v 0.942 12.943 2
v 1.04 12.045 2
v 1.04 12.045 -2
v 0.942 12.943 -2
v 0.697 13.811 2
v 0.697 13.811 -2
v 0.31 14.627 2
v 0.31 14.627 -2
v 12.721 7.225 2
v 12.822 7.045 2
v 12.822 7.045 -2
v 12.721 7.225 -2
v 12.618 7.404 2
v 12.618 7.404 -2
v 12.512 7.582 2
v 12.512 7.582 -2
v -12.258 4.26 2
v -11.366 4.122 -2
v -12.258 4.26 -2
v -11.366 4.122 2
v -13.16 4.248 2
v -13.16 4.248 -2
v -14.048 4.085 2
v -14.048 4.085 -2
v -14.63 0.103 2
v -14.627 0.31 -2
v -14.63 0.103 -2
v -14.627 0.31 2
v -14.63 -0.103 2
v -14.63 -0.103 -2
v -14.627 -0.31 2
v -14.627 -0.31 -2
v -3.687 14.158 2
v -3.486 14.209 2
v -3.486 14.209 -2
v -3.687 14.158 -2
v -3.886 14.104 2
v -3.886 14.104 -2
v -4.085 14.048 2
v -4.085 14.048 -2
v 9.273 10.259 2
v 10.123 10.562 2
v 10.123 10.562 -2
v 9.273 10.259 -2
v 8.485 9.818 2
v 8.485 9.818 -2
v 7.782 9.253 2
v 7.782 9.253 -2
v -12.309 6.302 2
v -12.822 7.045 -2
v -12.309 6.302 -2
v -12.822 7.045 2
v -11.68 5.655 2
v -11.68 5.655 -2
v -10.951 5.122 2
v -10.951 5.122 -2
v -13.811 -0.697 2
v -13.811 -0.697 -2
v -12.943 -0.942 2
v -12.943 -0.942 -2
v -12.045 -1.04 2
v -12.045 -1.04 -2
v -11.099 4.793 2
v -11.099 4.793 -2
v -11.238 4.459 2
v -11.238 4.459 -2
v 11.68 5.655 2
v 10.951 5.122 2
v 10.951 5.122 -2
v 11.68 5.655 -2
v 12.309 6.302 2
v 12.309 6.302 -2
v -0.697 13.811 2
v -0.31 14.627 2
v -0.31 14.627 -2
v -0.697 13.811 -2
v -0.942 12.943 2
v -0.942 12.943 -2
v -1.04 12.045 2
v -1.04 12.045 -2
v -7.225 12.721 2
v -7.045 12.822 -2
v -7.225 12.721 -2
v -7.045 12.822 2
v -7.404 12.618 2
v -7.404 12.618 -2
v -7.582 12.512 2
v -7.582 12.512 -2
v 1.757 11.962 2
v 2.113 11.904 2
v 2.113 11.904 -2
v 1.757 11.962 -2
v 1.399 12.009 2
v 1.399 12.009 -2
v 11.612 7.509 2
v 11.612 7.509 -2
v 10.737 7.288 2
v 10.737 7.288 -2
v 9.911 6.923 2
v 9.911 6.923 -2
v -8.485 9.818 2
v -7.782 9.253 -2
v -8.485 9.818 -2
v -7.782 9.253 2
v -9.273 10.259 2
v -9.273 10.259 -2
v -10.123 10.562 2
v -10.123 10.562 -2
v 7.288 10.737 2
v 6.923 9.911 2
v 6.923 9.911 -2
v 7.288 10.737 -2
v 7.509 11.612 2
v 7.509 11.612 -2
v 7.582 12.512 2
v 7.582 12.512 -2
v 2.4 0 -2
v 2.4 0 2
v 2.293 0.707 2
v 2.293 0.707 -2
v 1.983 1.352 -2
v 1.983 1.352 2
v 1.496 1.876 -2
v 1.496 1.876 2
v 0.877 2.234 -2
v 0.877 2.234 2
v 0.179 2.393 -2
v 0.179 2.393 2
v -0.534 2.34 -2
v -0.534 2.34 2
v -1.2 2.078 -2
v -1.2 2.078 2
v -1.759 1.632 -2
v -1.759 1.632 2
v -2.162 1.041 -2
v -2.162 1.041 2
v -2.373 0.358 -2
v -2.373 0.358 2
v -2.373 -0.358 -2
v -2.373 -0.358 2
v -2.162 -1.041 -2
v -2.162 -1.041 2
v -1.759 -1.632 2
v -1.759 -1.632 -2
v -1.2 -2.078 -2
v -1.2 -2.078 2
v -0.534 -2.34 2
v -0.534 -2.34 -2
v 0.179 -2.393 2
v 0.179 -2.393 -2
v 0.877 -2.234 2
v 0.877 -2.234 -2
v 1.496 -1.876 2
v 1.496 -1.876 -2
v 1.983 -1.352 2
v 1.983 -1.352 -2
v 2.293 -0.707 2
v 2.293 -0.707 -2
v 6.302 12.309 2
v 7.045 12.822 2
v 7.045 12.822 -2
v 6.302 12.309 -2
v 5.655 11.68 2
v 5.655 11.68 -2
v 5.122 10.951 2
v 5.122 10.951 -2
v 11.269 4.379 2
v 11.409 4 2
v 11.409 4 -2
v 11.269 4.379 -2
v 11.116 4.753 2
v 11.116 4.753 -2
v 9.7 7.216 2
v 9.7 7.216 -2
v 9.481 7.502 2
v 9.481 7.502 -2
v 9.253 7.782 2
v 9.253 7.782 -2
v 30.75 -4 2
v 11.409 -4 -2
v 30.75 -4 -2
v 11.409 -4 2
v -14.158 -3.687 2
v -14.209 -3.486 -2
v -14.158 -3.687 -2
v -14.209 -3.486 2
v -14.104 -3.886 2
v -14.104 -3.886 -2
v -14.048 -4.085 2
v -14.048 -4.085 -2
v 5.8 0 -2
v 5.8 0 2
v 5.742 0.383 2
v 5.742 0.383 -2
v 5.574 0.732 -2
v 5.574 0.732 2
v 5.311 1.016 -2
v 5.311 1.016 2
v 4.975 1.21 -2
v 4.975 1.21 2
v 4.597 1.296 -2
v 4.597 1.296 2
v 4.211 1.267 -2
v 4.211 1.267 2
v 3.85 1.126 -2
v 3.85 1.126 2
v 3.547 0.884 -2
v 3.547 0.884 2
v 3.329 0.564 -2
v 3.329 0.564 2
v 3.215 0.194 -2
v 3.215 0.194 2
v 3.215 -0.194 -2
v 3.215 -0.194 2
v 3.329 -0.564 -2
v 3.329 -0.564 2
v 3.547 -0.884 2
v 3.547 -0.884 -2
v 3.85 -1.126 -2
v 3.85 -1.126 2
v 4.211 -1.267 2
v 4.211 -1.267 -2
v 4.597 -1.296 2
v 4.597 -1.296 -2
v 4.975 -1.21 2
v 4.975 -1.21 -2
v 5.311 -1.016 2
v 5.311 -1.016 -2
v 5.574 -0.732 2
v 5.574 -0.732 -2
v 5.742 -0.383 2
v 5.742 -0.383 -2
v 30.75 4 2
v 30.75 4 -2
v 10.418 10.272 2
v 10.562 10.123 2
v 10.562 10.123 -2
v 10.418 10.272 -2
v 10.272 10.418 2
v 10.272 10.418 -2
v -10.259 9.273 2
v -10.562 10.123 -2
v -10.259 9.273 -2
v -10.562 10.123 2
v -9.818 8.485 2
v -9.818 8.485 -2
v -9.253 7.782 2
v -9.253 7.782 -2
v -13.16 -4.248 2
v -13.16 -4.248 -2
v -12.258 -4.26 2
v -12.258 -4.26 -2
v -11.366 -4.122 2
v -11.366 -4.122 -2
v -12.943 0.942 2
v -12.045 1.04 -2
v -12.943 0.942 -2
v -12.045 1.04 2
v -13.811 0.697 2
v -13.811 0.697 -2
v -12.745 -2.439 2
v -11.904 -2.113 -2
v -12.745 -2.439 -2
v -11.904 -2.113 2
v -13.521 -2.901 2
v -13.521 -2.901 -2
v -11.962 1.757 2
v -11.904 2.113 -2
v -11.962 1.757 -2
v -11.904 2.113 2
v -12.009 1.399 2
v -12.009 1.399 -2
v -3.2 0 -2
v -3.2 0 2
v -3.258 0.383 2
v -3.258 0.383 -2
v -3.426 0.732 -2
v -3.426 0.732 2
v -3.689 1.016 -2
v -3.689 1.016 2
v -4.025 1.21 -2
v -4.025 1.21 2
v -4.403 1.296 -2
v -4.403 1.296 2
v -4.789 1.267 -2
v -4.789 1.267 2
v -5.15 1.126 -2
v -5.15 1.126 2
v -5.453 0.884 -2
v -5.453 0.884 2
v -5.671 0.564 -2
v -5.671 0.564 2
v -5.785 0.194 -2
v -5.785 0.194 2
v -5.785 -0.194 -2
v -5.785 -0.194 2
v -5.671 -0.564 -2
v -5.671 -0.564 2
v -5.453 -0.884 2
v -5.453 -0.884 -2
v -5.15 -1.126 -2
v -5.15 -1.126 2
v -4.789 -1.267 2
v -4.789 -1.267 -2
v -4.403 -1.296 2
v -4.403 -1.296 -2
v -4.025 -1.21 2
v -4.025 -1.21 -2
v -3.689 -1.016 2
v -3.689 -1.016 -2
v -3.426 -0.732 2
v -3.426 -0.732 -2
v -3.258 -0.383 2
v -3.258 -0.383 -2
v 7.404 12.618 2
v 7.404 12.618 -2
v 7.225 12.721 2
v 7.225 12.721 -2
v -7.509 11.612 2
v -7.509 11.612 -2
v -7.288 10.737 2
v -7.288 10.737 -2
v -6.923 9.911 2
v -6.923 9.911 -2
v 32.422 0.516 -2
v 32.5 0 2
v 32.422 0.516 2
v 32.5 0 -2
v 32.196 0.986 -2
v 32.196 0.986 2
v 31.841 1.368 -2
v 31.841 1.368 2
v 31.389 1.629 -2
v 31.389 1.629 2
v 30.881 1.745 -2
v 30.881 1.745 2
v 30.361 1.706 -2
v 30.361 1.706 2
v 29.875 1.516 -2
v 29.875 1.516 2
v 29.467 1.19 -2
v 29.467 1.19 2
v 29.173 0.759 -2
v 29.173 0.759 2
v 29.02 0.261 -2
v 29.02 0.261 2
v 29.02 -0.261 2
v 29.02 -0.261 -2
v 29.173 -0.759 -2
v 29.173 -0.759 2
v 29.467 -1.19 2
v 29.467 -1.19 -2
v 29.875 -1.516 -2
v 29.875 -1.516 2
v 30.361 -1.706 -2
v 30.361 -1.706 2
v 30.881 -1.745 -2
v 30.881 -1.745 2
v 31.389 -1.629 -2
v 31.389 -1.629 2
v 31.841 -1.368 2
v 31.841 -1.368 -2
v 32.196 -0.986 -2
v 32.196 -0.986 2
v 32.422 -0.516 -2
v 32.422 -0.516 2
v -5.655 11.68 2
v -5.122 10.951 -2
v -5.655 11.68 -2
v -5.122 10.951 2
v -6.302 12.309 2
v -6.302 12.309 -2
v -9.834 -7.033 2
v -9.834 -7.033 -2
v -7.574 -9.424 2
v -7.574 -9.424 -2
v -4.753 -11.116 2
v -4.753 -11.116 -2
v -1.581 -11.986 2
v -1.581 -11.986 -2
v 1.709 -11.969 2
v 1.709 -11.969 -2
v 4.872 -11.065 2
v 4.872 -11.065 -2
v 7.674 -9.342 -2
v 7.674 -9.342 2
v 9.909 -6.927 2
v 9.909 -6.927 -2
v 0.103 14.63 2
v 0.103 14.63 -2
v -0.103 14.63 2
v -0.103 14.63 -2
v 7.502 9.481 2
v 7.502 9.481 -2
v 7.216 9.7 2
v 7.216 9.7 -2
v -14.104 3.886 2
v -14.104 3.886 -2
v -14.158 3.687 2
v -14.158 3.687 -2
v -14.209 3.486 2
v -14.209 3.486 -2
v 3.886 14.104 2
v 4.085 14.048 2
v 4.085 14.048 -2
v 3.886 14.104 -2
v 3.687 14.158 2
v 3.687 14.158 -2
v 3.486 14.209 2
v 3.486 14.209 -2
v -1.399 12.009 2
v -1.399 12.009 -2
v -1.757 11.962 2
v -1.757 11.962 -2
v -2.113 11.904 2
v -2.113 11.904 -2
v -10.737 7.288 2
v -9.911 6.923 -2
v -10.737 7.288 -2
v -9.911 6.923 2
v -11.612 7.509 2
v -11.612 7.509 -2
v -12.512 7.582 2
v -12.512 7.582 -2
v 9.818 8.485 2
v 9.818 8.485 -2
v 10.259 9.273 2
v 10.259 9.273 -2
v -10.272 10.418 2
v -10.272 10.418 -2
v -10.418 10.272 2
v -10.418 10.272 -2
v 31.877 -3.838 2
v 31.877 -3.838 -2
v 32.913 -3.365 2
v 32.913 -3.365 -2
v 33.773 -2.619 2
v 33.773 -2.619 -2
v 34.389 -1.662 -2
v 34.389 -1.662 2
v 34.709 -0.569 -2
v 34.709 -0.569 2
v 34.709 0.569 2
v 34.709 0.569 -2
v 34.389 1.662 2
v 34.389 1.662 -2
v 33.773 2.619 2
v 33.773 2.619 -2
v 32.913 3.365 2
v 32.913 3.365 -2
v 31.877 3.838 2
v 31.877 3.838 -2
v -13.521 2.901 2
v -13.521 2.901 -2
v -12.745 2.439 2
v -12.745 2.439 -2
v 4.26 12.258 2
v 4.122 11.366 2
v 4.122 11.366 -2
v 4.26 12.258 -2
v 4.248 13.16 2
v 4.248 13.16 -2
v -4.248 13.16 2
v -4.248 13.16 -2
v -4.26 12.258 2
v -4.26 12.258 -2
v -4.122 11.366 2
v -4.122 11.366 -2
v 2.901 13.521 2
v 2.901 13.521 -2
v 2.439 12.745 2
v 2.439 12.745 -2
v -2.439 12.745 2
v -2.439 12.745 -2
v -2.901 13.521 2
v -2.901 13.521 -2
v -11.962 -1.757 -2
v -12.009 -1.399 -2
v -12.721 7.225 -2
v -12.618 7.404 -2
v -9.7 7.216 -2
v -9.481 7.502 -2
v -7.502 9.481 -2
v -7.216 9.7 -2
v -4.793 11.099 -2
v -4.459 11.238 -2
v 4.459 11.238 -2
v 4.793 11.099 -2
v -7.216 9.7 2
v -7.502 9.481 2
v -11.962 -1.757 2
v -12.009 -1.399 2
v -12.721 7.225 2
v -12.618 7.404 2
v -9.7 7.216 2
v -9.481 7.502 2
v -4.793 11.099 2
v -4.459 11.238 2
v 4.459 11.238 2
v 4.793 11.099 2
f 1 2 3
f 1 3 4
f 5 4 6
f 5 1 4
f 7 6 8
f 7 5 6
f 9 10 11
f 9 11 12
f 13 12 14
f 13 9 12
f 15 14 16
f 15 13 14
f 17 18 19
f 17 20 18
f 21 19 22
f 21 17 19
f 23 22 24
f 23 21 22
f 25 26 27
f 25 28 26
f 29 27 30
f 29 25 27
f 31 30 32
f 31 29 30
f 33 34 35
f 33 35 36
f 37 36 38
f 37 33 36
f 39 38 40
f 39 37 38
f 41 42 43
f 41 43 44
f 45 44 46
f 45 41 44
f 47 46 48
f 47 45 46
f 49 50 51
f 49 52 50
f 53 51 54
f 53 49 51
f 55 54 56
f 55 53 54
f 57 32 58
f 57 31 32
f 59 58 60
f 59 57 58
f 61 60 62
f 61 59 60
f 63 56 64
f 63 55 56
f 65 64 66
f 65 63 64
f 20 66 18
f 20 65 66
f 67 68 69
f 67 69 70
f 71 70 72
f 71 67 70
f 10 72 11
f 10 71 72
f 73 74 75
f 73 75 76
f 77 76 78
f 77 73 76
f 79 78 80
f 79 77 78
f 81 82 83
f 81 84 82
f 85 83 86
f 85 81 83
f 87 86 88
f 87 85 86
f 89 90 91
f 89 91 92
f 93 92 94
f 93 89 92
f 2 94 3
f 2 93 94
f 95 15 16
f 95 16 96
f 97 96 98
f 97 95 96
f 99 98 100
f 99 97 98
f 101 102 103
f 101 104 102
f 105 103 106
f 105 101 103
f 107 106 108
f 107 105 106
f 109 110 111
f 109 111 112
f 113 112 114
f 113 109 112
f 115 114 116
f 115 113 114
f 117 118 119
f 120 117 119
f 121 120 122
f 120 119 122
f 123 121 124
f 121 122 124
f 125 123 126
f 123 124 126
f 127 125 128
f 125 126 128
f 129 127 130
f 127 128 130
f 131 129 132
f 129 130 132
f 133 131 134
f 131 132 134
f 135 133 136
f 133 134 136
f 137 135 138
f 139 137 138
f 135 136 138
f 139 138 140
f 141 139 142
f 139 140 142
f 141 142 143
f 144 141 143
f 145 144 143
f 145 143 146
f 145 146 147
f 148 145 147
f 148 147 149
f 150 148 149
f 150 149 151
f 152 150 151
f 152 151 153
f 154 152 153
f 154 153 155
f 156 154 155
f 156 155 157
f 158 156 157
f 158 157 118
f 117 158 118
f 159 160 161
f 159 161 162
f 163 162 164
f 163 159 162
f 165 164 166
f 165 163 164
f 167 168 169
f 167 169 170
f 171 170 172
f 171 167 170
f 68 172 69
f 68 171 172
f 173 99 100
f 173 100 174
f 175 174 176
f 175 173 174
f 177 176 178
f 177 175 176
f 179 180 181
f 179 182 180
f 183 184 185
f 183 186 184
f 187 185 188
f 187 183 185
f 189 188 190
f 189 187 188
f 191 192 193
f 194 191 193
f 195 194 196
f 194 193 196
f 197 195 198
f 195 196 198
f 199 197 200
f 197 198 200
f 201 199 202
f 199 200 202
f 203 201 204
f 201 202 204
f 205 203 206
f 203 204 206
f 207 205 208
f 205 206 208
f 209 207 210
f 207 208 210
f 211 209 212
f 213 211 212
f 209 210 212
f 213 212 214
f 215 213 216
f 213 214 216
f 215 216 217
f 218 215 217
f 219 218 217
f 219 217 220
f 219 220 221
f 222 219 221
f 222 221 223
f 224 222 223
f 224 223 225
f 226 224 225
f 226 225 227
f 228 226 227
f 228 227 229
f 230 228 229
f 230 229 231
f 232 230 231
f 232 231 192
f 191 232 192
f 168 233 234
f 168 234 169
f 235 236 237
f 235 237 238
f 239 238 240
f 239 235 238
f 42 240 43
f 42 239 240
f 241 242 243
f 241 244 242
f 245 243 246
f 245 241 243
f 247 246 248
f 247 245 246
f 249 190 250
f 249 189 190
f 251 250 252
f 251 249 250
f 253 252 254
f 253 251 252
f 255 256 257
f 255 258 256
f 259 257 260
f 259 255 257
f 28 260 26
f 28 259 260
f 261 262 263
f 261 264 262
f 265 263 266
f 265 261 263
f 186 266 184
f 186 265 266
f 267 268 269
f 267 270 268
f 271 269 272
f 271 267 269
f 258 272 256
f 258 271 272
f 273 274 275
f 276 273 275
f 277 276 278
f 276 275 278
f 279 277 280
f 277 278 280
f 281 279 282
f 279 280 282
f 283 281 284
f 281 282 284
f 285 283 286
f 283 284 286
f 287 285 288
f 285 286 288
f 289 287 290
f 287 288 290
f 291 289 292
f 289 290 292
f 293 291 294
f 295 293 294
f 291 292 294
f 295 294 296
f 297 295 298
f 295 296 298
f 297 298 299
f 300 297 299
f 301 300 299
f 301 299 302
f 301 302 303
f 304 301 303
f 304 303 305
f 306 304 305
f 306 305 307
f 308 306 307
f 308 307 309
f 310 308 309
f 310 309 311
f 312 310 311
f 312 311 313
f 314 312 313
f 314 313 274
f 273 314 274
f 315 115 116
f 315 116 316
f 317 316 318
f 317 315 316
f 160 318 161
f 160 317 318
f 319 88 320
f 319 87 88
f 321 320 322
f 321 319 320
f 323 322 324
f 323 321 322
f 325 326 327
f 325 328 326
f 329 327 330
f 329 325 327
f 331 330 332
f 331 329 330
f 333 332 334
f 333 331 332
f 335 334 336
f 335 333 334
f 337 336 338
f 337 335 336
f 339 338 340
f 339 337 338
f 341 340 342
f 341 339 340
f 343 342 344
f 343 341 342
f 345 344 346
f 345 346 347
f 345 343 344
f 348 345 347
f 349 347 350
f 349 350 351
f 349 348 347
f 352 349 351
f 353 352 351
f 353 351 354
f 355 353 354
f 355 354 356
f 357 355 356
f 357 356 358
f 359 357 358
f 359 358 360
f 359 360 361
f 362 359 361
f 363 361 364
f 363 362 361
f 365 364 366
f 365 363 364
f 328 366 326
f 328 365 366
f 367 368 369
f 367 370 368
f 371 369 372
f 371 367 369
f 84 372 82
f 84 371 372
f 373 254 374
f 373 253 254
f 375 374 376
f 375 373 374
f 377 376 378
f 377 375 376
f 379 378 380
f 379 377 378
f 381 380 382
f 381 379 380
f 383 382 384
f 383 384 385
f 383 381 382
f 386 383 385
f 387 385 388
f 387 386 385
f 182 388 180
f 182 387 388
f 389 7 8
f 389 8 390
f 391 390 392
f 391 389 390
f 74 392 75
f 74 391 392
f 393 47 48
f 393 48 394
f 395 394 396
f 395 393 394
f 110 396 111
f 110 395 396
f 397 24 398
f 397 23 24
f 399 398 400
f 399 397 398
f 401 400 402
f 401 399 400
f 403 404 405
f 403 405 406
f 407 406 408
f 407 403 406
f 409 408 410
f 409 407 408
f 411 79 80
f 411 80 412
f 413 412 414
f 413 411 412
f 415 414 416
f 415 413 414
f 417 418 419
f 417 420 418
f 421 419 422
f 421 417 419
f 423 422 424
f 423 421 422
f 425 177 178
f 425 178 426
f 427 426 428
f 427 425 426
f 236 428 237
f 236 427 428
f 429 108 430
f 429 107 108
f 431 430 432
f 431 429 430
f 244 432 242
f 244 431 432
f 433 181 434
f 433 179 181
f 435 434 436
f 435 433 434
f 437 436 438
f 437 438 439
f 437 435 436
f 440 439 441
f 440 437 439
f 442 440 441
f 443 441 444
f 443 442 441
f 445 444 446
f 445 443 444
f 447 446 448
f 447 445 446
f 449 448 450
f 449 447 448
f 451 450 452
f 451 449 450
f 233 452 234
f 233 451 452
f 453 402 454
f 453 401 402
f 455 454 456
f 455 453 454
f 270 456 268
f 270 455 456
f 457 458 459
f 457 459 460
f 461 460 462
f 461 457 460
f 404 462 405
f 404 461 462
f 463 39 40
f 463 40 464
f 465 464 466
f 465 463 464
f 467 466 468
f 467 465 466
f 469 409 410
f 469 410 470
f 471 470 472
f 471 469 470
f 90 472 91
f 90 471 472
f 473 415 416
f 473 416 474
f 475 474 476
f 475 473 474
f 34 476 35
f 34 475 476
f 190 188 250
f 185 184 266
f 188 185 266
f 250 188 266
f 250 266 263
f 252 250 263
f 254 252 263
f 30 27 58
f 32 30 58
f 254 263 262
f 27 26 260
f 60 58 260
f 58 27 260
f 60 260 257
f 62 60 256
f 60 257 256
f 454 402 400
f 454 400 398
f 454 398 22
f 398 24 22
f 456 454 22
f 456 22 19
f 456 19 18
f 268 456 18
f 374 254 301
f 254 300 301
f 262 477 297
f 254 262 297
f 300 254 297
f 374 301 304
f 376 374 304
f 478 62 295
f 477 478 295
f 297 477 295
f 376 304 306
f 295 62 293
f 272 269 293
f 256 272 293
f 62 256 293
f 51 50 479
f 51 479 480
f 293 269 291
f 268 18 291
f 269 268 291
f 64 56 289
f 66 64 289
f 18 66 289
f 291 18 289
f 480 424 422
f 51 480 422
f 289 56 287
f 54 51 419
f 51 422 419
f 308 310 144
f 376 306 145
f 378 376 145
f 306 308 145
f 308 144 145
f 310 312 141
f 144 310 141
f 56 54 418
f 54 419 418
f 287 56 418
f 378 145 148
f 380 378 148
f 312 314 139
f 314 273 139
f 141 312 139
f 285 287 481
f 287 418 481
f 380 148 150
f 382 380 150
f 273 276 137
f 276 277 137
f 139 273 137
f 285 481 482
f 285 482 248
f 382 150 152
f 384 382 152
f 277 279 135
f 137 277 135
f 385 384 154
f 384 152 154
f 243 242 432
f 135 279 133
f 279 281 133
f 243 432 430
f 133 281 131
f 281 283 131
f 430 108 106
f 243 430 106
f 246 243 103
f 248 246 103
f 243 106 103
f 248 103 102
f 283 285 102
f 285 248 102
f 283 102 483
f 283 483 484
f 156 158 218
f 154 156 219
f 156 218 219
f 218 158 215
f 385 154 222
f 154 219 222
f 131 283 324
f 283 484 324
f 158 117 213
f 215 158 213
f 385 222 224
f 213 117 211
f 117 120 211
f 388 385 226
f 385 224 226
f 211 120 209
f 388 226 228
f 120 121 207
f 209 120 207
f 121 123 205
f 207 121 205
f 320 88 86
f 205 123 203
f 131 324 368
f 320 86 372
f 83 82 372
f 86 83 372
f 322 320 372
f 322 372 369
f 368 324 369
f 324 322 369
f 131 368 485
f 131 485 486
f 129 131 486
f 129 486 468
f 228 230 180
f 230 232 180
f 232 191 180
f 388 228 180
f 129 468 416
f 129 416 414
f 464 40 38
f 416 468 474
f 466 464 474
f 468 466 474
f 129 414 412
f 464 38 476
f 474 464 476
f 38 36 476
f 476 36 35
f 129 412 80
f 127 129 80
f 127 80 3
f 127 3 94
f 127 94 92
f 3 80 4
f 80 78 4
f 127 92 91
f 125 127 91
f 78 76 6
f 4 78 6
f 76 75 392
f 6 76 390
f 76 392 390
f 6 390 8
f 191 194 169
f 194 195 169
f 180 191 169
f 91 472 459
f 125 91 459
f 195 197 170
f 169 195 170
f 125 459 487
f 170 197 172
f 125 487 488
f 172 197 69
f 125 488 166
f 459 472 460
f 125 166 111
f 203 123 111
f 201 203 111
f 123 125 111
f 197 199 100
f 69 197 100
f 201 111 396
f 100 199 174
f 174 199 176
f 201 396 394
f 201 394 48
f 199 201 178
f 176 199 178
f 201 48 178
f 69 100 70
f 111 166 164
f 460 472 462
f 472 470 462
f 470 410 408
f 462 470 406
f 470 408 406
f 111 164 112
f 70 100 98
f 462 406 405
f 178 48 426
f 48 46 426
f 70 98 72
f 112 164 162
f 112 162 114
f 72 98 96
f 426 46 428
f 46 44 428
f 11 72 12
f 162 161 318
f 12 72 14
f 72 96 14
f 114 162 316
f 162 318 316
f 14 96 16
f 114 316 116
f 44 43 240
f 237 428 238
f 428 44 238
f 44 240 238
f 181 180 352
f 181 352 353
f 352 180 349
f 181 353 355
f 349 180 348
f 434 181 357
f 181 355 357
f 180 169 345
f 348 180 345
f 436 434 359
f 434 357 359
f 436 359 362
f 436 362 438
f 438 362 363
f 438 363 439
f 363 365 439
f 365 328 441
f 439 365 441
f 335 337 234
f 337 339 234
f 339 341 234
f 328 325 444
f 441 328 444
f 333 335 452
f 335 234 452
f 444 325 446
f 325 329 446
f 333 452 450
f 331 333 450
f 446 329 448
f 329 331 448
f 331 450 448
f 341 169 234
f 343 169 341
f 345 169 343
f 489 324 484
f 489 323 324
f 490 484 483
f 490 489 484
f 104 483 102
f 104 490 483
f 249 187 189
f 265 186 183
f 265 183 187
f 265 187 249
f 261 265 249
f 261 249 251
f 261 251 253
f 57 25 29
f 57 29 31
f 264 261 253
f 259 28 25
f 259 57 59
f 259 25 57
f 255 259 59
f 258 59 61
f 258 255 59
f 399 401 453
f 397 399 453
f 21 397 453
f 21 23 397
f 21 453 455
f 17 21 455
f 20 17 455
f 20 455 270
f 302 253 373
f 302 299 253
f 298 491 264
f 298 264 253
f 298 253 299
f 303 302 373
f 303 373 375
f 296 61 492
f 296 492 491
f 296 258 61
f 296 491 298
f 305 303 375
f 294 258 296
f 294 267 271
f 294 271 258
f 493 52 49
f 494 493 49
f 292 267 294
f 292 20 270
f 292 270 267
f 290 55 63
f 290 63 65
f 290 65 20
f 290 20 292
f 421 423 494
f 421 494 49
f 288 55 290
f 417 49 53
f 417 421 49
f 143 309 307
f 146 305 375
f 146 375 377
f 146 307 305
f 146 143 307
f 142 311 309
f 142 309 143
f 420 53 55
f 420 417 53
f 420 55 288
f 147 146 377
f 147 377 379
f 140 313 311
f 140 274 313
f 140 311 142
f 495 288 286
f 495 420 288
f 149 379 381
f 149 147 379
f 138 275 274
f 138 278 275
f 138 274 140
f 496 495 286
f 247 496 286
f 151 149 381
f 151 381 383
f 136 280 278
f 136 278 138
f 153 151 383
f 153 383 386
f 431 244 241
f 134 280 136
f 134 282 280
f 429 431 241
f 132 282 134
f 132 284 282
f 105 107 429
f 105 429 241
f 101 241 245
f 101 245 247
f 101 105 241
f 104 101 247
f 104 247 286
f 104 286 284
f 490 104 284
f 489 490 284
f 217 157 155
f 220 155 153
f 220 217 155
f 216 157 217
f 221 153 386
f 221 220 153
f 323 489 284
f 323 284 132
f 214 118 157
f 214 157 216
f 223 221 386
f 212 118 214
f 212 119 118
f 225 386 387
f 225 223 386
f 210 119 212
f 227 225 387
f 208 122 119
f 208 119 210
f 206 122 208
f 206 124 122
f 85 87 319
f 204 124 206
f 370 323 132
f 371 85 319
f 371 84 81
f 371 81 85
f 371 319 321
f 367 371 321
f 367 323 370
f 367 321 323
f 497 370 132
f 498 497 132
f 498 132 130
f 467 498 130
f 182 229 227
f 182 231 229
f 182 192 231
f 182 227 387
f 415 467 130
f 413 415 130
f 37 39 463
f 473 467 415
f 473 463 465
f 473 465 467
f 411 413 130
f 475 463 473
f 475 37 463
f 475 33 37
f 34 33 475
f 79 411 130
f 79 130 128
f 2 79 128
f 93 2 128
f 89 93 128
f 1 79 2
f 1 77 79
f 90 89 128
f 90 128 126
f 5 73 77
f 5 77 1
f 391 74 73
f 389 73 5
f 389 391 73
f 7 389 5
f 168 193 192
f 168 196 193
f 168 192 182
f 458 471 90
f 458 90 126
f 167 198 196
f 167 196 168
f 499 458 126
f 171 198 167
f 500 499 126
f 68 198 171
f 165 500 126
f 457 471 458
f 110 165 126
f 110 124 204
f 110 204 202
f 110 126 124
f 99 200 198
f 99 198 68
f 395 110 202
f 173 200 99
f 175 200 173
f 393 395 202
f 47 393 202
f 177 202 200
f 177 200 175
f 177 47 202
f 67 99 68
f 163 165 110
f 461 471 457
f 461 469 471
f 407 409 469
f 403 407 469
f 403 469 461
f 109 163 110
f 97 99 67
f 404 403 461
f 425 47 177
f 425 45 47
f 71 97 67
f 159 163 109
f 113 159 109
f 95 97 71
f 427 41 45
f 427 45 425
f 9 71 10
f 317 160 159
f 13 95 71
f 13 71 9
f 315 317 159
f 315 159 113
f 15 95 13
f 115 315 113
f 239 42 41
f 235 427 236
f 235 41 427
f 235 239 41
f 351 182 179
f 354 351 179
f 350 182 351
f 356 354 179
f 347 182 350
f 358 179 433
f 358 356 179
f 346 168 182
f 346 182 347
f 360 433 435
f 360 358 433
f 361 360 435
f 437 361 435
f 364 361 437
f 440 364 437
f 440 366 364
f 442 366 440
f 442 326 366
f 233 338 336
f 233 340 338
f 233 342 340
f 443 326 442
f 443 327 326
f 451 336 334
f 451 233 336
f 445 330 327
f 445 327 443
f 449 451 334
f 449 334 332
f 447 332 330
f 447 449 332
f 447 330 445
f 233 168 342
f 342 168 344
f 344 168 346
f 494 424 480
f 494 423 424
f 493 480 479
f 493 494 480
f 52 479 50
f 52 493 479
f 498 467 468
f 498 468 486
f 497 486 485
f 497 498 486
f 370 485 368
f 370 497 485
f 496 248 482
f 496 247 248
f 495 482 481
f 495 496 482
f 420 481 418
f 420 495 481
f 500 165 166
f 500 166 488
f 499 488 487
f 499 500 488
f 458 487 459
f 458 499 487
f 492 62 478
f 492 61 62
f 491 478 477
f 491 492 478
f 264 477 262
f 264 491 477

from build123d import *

# Parameters (mm, degrees)
ESQUISSE1_R                  = 1.75
BOSS_EXTRU_1_DEPTH           = 2
ESQUISSE2_R                  = 1.3
ESQUISSE2_R_2                = 2.4
ENL_V_MAT_EXTRU_1_DEPTH      = 1
ENL_V_MAT_EXTRU_1_DEPTH_BACK = 5


with BuildPart() as part:
    # Esquisse1 → Boss.-Extru.1 (new body, symmetric)
    with BuildSketch(Plane.XY):
        with BuildLine():
            ThreePointArc((30.75, -4), (34.75, 0), (30.75, 4))
            Line((30.75, 4), (11.409123542, 4))
            ThreePointArc((11.409123542, 4), (11.194344337, 4.566700654), (10.951436862, 5.12192646))
            ThreePointArc((10.951436862, 5.12192646), (12.008090957, 5.965388247), (12.82210701, 7.044889767))
            ThreePointArc((12.82210701, 7.044889767), (12.669951657, 7.315), (12.51210701, 7.581825517))
            ThreePointArc((12.51210701, 7.581825517), (11.170223244, 7.416617696), (9.911436862, 6.9232593))
            ThreePointArc((9.911436862, 6.9232593), (9.591641884, 7.359925677), (9.252623584, 7.781841479))
            ThreePointArc((9.252623584, 7.781841479), (10.05496909, 8.870045207), (10.561852666, 10.123446462))
            ThreePointArc((10.561852666, 10.123446462), (10.344972209, 10.344972209), (10.123446462, 10.561852666))
            ThreePointArc((10.123446462, 10.561852666), (8.870045207, 10.05496909), (7.781841479, 9.252623584))
            ThreePointArc((7.781841479, 9.252623584), (7.359925677, 9.591641884), (6.9232593, 9.911436862))
            ThreePointArc((6.9232593, 9.911436862), (7.416617696, 11.170223244), (7.581825517, 12.51210701))
            ThreePointArc((7.581825517, 12.51210701), (7.315, 12.669951657), (7.044889767, 12.82210701))
            ThreePointArc((7.044889767, 12.82210701), (5.965388247, 12.008090957), (5.12192646, 10.951436862))
            ThreePointArc((5.12192646, 10.951436862), (4.626642697, 11.169703548), (4.122086336, 11.365584201))
            ThreePointArc((4.122086336, 11.365584201), (4.272836063, 12.709169027), (4.085109489, 14.048088143))
            ThreePointArc((4.085109489, 14.048088143), (3.78652263, 14.131494839), (3.486235477, 14.208555951))
            ThreePointArc((3.486235477, 14.208555951), (2.654199937, 13.14288127), (2.112960617, 11.903927815))
            ThreePointArc((2.112960617, 11.903927815), (1.578061664, 11.986568374), (1.04, 12.04518576))
            ThreePointArc((1.04, 12.04518576), (0.837867713, 13.382005944), (0.31, 14.626715284))
            ThreePointArc((0.31, 14.626715284), (0, 14.63), (-0.31, 14.626715284))
            ThreePointArc((-0.31, 14.626715284), (-0.837867713, 13.382005944), (-1.04, 12.04518576))
            ThreePointArc((-1.04, 12.04518576), (-1.578061664, 11.986568374), (-2.112960617, 11.903927815))
            ThreePointArc((-2.112960617, 11.903927815), (-2.654199937, 13.14288127), (-3.486235477, 14.208555951))
            ThreePointArc((-3.486235477, 14.208555951), (-3.78652263, 14.131494839), (-4.085109489, 14.048088143))
            ThreePointArc((-4.085109489, 14.048088143), (-4.272836063, 12.709169027), (-4.122086336, 11.365584201))
            ThreePointArc((-4.122086336, 11.365584201), (-4.626642697, 11.169703548), (-5.12192646, 10.951436862))
            ThreePointArc((-5.12192646, 10.951436862), (-5.965388247, 12.008090957), (-7.044889767, 12.82210701))
            ThreePointArc((-7.044889767, 12.82210701), (-7.315, 12.669951657), (-7.581825517, 12.51210701))
            ThreePointArc((-7.581825517, 12.51210701), (-7.416617696, 11.170223244), (-6.9232593, 9.911436862))
            ThreePointArc((-6.9232593, 9.911436862), (-7.359925677, 9.591641884), (-7.781841479, 9.252623584))
            ThreePointArc((-7.781841479, 9.252623584), (-8.870045207, 10.05496909), (-10.123446462, 10.561852666))
            ThreePointArc((-10.123446462, 10.561852666), (-10.344972209, 10.344972209), (-10.561852666, 10.123446462))
            ThreePointArc((-10.561852666, 10.123446462), (-10.05496909, 8.870045207), (-9.252623584, 7.781841479))
            ThreePointArc((-9.252623584, 7.781841479), (-9.591641884, 7.359925677), (-9.911436862, 6.9232593))
            ThreePointArc((-9.911436862, 6.9232593), (-11.170223244, 7.416617696), (-12.51210701, 7.581825517))
            ThreePointArc((-12.51210701, 7.581825517), (-12.669951657, 7.315), (-12.82210701, 7.044889767))
            ThreePointArc((-12.82210701, 7.044889767), (-12.008090957, 5.965388247), (-10.951436862, 5.12192646))
            ThreePointArc((-10.951436862, 5.12192646), (-11.169703548, 4.626642697), (-11.365584201, 4.122086336))
            ThreePointArc((-11.365584201, 4.122086336), (-12.709169027, 4.272836063), (-14.048088143, 4.085109489))
            ThreePointArc((-14.048088143, 4.085109489), (-14.131494839, 3.78652263), (-14.208555951, 3.486235477))
            ThreePointArc((-14.208555951, 3.486235477), (-13.14288127, 2.654199937), (-11.903927815, 2.112960617))
            ThreePointArc((-11.903927815, 2.112960617), (-11.986568374, 1.578061664), (-12.04518576, 1.04))
            ThreePointArc((-12.04518576, 1.04), (-13.382005944, 0.837867713), (-14.626715284, 0.31))
            ThreePointArc((-14.626715284, 0.31), (-14.63, 0), (-14.626715284, -0.31))
            ThreePointArc((-14.626715284, -0.31), (-13.382005944, -0.837867713), (-12.04518576, -1.04))
            ThreePointArc((-12.04518576, -1.04), (-11.986568374, -1.578061664), (-11.903927815, -2.112960617))
            ThreePointArc((-11.903927815, -2.112960617), (-13.14288127, -2.654199937), (-14.208555951, -3.486235477))
            ThreePointArc((-14.208555951, -3.486235477), (-14.131494839, -3.78652263), (-14.048088143, -4.085109489))
            ThreePointArc((-14.048088143, -4.085109489), (-12.709169027, -4.272836063), (-11.365584201, -4.122086336))
            ThreePointArc((-11.365584201, -4.122086336), (0.064808849, -12.089826294), (11.409123542, -4))
            Line((11.409123542, -4), (30.75, -4))
        make_face()
        with Locations((30.75, 0)):
            Circle(ESQUISSE1_R, mode=Mode.SUBTRACT)
        Circle(ESQUISSE1_R, mode=Mode.SUBTRACT)
    extrude(amount=BOSS_EXTRU_1_DEPTH, both=True)

    # Esquisse2 → Enlèv. mat.-Extru.1 (cut, two sides)
    with BuildSketch(Plane.XY.offset(2)) as enl_v_mat_extru_1_sk:
        with Locations((4.5, 0)):
            Circle(ESQUISSE2_R)
        with Locations((-4.5, 0)):
            Circle(ESQUISSE2_R)
        Circle(ESQUISSE2_R_2)
    extrude(amount=ENL_V_MAT_EXTRU_1_DEPTH, mode=Mode.SUBTRACT)
    extrude(enl_v_mat_extru_1_sk.sketch, amount=-ENL_V_MAT_EXTRU_1_DEPTH_BACK, mode=Mode.SUBTRACT)


solid = part.part
